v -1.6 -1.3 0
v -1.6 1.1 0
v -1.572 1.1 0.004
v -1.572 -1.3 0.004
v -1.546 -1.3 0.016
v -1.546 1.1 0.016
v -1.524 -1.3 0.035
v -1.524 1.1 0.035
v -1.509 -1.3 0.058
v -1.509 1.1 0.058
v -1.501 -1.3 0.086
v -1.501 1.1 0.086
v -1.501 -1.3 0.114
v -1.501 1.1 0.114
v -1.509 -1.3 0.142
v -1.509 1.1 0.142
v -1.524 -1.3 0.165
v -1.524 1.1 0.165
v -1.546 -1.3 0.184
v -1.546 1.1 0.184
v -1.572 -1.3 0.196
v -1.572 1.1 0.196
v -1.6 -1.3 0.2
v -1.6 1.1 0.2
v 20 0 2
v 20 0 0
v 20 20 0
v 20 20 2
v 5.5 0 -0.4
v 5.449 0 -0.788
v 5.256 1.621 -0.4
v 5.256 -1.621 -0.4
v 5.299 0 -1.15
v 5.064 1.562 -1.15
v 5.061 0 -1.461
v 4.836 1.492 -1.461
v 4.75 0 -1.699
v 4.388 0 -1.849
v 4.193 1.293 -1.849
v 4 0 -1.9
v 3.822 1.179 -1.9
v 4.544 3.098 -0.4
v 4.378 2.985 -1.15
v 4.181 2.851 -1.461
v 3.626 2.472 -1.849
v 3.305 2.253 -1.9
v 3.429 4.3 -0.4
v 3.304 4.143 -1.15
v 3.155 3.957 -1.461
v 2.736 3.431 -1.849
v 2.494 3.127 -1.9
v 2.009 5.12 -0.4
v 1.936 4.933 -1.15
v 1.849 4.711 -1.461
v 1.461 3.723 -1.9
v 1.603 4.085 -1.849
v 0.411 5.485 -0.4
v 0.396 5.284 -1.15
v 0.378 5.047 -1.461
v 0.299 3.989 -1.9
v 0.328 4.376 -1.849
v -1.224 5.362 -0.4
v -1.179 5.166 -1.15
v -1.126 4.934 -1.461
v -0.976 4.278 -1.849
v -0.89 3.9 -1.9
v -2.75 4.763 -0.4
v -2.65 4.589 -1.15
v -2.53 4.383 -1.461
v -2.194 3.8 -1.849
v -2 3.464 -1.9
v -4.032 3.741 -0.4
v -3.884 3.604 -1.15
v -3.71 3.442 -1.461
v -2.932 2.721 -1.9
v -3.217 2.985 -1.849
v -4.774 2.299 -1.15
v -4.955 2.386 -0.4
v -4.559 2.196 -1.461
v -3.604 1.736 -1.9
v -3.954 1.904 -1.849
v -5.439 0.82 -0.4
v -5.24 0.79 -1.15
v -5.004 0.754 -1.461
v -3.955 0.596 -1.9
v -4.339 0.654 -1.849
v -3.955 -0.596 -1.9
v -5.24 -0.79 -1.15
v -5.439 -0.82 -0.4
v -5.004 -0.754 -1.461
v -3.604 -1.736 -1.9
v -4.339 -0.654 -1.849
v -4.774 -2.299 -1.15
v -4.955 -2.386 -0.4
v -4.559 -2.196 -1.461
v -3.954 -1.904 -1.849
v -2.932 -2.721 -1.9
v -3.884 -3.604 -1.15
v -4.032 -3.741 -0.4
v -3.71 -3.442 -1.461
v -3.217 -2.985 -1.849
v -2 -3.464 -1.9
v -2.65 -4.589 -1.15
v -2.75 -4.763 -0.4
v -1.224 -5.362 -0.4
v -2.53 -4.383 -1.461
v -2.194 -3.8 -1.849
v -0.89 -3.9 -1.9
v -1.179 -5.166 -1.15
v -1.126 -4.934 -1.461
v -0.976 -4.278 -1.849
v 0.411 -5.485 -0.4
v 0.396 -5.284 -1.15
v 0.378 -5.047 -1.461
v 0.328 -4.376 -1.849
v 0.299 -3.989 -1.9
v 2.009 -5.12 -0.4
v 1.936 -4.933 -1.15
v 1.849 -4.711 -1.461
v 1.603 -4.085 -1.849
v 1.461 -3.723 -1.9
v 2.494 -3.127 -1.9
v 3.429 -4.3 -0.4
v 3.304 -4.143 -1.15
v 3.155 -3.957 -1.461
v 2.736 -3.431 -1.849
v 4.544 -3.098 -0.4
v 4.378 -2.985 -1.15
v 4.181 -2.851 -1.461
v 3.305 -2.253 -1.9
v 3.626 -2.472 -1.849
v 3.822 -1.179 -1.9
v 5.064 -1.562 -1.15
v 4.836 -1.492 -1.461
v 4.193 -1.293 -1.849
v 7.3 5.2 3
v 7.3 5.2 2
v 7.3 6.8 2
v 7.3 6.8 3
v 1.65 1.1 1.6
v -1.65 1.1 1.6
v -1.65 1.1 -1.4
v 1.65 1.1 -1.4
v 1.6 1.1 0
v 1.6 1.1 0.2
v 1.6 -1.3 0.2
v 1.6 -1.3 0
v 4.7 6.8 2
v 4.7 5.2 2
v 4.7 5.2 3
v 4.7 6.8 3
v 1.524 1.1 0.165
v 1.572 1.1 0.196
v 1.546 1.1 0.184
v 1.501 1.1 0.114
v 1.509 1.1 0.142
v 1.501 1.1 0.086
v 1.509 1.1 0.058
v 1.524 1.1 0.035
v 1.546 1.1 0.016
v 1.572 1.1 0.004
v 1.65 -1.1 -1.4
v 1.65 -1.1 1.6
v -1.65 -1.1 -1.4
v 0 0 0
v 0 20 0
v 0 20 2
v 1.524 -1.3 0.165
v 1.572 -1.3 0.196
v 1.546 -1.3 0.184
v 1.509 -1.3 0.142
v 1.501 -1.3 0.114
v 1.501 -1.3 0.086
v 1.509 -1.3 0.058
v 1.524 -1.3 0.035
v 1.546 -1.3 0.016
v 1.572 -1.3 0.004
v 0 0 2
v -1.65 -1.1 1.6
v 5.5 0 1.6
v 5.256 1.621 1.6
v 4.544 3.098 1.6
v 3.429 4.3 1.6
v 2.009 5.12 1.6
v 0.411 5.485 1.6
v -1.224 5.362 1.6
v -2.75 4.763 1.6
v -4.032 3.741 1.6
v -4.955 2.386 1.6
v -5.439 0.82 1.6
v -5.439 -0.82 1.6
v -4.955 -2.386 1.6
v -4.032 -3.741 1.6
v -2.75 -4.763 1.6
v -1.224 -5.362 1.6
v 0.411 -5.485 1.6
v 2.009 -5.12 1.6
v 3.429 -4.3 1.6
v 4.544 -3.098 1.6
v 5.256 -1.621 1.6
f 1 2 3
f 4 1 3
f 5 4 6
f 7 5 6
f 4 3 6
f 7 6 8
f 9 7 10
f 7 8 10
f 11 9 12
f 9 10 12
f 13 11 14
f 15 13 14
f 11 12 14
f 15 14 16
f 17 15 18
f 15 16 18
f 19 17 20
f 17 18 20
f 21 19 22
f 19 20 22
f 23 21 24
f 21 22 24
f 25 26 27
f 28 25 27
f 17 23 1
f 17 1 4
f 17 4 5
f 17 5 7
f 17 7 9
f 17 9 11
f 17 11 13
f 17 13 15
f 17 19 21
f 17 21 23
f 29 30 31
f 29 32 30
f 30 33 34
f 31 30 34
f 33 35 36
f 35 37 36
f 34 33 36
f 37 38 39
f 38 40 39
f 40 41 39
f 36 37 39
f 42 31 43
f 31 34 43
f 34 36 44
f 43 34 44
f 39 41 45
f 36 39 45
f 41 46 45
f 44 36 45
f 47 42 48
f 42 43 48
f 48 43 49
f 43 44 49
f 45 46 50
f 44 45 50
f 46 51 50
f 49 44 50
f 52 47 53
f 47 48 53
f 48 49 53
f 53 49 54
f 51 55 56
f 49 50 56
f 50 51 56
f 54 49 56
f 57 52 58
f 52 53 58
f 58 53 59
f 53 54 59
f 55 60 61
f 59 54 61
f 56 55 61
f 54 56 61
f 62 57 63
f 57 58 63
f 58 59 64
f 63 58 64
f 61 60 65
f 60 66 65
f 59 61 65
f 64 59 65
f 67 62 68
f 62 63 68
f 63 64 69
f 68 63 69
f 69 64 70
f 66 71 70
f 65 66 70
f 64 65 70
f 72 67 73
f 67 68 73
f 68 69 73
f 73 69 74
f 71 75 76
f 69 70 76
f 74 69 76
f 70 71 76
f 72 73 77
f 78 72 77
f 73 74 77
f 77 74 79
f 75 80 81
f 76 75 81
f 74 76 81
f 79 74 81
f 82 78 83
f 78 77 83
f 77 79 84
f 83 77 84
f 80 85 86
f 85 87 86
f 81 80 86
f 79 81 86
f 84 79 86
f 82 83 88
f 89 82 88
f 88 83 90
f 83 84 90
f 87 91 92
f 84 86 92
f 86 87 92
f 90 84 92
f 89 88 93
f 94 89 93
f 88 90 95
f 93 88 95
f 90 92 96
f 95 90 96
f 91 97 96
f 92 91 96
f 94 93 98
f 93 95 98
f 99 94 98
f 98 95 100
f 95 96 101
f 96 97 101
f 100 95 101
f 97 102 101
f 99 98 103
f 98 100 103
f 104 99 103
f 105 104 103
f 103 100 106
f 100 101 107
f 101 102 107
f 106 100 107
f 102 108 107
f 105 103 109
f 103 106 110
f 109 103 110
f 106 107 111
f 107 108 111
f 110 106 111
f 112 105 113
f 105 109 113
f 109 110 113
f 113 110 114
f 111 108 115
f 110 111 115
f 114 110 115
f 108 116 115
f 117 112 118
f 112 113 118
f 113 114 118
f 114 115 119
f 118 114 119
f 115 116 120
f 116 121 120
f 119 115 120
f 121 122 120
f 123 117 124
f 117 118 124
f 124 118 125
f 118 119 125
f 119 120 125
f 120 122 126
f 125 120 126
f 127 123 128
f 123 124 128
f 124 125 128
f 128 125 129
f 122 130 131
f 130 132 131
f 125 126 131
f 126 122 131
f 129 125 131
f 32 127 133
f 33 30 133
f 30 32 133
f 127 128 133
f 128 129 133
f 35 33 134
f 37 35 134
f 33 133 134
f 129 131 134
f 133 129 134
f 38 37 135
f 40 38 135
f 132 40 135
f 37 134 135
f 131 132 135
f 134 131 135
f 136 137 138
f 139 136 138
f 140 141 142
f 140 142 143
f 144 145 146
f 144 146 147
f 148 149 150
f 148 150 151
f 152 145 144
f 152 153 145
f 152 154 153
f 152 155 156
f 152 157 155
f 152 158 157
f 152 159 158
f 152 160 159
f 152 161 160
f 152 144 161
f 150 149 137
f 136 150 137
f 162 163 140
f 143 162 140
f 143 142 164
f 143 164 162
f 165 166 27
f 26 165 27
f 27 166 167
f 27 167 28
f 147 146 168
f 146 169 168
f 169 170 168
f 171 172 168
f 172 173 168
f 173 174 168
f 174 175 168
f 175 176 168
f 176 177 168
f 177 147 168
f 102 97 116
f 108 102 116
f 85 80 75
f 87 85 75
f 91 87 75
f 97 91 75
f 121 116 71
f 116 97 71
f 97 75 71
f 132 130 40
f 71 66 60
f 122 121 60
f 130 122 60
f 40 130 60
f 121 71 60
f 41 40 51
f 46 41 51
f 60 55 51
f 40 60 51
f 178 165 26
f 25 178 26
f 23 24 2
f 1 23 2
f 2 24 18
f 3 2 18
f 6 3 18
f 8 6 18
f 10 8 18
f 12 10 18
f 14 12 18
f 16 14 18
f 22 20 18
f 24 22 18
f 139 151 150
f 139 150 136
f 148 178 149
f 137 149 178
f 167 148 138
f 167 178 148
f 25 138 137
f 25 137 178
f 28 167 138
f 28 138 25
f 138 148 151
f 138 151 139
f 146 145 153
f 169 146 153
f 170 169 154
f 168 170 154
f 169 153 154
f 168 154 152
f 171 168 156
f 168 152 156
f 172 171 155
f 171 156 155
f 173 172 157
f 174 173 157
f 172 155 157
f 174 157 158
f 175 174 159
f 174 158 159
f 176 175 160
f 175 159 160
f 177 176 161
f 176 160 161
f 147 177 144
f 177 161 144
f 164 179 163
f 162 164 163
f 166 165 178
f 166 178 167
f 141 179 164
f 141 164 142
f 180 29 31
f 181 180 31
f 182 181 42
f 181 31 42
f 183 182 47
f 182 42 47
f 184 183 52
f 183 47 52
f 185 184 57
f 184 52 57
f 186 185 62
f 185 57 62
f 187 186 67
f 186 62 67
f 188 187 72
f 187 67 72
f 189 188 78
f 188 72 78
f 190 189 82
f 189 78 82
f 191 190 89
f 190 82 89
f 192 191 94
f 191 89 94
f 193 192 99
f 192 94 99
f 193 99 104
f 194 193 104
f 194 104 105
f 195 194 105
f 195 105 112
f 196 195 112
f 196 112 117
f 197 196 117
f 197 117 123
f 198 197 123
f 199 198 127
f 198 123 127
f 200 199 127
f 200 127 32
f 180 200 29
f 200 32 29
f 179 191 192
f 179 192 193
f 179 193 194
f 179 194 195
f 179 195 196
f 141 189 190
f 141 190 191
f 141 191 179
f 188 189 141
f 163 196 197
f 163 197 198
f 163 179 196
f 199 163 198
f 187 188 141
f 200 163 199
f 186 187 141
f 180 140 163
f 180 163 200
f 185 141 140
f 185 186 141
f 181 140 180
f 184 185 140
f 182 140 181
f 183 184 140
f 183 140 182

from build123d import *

# Parameters (mm, degrees)
PAD_DEPTH      = 2.4
CYLINDER_R     = 5.5
CYLINDER_DEPTH = 3.5
SKETCH_W       = 3.3
SKETCH_H       = 2.2
POCKET_DEPTH   = 3
FILLET_R       = 1.5
BOX_W          = 20
BOX_H          = 20
BOX_DEPTH      = 2
SKETCH002_W    = 2.6
SKETCH002_H    = 1.6
PAD001_DEPTH   = 1


with BuildPart() as pad:
    # Sketch001 → Pad (new body)
    with BuildSketch(Plane(origin=(0, 1.1, 0.1), x_dir=(1, 0, 0), z_dir=(0, -1, 0))):
        with BuildLine():
            Line((-1.6, 0.1), (-1.6, -0.1))
            ThreePointArc((-1.6, -0.1), (-1.5, 0), (-1.6, 0.1))
        make_face()
        with BuildLine():
            Line((1.6, 0.1), (1.6, -0.1))
            ThreePointArc((1.6, 0.1), (1.5, 0), (1.6, -0.1))
        make_face()
    extrude(amount=PAD_DEPTH)


with BuildPart() as fillet_body:
    # Cylinder → Cylinder (new body)
    with BuildSketch(Plane.XY.offset(-1.9)):
        Circle(CYLINDER_R)
    extrude(amount=CYLINDER_DEPTH)

    # Sketch → Pocket (cut)
    with BuildSketch(Plane.XY.offset(1.6)):
        Rectangle(SKETCH_W, SKETCH_H)
    extrude(amount=-POCKET_DEPTH, mode=Mode.SUBTRACT)

    # Fillet
    fillet_edges = [fillet_body.edges().sort_by_distance(p)[0] for p in [
        (-5.5, 0, -1.9),
    ]]
    fillet(fillet_edges, radius=FILLET_R)


with BuildPart() as pad001:
    # Box → Box (new body)
    with BuildSketch(Plane.XY):
        with Locations((10, 10)):
            Rectangle(BOX_W, BOX_H)
    extrude(amount=BOX_DEPTH)

    # Sketch002 → Pad001 (new body)
    with BuildSketch(Plane.XY.offset(2)):
        with Locations((6, 6)):
            Rectangle(SKETCH002_W, SKETCH002_H)
    extrude(amount=PAD001_DEPTH)


solid = Compound([pad.part, fillet_body.part, pad001.part])
